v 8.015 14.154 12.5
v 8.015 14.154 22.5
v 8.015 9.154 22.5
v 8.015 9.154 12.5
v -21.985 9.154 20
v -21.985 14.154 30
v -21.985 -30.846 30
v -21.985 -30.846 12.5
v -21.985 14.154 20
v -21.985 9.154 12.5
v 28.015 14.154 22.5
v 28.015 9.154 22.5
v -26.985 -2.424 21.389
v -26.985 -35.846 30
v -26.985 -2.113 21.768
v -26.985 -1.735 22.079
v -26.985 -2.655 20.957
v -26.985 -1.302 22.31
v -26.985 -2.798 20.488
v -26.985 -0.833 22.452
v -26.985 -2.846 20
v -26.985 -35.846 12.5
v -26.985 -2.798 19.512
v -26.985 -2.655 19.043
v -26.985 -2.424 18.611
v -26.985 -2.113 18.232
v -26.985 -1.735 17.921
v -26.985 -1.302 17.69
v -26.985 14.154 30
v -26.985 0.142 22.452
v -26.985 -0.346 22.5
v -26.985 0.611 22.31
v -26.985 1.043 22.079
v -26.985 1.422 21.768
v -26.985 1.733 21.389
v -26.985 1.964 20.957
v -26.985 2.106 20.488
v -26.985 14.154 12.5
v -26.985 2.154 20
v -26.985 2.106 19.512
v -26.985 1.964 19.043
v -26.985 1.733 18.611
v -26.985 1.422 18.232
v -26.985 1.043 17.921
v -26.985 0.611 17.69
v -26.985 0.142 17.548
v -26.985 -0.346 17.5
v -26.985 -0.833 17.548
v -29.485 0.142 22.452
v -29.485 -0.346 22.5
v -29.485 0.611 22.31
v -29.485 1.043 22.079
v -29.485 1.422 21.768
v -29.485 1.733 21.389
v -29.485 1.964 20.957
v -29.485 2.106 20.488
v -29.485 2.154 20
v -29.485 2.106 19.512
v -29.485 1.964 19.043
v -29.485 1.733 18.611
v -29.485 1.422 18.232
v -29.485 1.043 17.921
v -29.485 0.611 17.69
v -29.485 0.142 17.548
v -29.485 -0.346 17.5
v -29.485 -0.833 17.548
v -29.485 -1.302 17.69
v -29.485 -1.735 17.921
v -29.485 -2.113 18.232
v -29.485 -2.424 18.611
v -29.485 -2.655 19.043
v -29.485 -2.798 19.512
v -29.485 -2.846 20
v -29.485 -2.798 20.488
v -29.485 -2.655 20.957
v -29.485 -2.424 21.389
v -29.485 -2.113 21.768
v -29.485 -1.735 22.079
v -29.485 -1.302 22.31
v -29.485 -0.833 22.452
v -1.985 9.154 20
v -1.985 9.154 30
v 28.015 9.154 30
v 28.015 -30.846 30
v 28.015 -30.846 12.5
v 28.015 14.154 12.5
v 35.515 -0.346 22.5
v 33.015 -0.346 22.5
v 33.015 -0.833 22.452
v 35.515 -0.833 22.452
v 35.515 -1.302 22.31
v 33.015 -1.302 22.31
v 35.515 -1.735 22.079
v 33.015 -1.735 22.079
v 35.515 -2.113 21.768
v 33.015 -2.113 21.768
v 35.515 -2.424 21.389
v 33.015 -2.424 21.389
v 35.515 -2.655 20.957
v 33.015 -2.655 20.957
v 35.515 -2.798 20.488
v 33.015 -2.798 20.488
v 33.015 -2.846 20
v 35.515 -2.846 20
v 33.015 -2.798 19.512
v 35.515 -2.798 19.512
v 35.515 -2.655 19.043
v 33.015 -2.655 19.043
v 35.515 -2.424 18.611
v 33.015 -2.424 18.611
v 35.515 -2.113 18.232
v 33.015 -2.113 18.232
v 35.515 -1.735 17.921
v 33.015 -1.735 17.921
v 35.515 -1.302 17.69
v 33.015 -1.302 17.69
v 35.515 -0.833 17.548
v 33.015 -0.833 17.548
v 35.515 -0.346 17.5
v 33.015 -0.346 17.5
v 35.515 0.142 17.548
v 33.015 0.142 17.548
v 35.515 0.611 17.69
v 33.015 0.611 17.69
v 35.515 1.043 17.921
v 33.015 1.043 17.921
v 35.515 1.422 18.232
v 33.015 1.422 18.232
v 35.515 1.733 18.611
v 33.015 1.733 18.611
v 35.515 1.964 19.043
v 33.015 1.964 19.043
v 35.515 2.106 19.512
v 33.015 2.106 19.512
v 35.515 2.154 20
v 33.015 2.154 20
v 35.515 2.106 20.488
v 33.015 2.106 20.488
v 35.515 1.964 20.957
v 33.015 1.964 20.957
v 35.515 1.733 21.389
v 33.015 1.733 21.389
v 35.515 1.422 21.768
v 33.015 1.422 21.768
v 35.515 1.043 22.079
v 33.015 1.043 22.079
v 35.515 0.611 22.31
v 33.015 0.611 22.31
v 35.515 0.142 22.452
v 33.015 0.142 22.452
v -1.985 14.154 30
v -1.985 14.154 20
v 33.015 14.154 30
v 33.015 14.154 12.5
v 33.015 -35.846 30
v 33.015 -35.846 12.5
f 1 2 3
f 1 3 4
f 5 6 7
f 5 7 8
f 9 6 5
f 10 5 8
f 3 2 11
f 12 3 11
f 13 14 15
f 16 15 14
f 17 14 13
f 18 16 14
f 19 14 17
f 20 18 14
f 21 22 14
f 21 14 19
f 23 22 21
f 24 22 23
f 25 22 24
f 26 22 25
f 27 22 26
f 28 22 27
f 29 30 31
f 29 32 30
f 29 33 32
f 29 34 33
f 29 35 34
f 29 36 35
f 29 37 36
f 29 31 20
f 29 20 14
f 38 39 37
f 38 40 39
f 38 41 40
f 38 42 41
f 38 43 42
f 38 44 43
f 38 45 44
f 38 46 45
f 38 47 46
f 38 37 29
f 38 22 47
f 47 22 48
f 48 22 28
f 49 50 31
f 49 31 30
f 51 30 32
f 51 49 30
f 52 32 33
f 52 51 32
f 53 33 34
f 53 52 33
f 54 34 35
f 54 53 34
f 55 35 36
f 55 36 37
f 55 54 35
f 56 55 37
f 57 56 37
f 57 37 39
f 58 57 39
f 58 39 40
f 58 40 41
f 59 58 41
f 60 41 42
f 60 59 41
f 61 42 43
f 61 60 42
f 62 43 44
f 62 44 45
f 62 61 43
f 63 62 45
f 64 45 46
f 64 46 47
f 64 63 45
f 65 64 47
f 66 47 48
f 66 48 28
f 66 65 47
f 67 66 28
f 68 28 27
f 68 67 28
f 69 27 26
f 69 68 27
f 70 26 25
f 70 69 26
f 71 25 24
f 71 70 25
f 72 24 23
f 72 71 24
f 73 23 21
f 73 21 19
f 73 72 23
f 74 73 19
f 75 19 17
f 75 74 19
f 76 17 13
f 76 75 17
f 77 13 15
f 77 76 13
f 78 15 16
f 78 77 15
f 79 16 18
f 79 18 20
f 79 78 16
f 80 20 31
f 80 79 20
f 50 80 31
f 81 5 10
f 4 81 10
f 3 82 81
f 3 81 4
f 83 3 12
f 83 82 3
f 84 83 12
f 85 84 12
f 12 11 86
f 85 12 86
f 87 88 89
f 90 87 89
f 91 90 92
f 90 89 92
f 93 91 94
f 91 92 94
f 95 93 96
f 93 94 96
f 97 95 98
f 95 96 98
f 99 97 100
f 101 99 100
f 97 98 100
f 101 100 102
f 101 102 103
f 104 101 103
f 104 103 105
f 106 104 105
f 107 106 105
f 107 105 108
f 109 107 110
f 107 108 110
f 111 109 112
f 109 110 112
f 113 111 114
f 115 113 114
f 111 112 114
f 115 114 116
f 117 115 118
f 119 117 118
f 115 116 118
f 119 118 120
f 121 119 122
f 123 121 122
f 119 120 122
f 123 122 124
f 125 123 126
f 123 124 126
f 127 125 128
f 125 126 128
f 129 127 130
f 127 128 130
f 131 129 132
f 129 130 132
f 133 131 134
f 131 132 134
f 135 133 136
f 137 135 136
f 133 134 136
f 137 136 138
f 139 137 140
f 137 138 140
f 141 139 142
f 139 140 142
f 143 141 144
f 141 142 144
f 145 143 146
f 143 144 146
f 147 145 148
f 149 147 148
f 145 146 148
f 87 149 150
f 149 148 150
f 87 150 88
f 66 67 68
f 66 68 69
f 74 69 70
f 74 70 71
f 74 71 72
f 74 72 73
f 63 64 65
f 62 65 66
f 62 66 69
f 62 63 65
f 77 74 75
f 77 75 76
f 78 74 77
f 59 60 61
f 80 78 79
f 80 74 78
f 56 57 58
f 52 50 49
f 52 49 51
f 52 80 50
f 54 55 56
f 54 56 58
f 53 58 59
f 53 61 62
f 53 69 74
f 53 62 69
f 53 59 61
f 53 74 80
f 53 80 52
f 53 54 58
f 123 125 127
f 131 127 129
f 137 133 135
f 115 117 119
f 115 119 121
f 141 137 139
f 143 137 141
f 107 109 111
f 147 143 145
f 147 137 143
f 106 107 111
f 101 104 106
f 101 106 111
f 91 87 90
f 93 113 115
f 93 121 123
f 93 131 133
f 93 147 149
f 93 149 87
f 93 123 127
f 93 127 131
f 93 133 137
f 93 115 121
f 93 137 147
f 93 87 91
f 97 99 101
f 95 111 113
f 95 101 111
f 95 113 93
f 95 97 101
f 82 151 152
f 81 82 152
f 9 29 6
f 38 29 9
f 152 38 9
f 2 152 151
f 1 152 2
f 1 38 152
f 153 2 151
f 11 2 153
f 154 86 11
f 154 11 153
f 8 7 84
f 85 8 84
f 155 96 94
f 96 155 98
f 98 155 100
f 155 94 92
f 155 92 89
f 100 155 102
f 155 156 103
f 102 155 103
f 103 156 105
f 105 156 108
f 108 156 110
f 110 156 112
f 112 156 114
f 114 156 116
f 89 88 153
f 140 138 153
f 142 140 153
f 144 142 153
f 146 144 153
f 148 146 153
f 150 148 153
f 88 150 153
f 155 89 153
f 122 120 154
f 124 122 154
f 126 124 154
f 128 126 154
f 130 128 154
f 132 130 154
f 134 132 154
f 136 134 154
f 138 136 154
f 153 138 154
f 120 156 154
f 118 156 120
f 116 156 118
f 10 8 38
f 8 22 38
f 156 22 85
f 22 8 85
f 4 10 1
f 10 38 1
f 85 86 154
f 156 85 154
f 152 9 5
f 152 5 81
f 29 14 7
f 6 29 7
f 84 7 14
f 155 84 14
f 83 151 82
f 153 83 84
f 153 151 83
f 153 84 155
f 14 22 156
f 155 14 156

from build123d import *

# Parameters (mm, degrees)
SKETCH1_W           = 60
SKETCH1_H           = 50
BOSS_EXTRUDE1_DEPTH = 30
SKETCH2_W           = 50
SKETCH2_H           = 40
CUT_EXTRUDE1_DEPTH  = 58.226541049
SKETCH3_W           = 20
SKETCH3_H           = 22.5
CUT_EXTRUDE2_DEPTH  = 5
SKETCH4_W           = 20
SKETCH4_H           = 10
CUT_EXTRUDE3_DEPTH  = 10
SKETCH5_W           = 62.459499436
SKETCH5_H           = 12.5
CUT_EXTRUDE4_DEPTH  = 68.007244418
SKETCH6_R           = 2.5
BOSS_EXTRUDE2_DEPTH = 2.5
BOSS_EXTRUDE3_START = 2.5
SKETCH7_R           = 2.5
BOSS_EXTRUDE3_DEPTH = 2.5


with BuildPart() as part:
    # Sketch1 → Boss-Extrude1 (new body)
    with BuildSketch(Plane.XY):
        with Locations((3.014705882, -10.845588235)):
            Rectangle(SKETCH1_W, SKETCH1_H)
    extrude(amount=BOSS_EXTRUDE1_DEPTH)

    # Sketch2 → Cut-Extrude1 (cut, through all)
    with BuildSketch(Plane.XY.offset(30)):
        with Locations((3.014705882, -10.845588235)):
            Rectangle(SKETCH2_W, SKETCH2_H)
    extrude(amount=-CUT_EXTRUDE1_DEPTH, mode=Mode.SUBTRACT)

    # Sketch3 → Cut-Extrude2 (cut)
    with BuildSketch(Plane(origin=(0, 14.154411765, 0), x_dir=(1, 0, 0), z_dir=(0, 1, 0))):
        with Locations((18.014705882, -11.25)):
            Rectangle(SKETCH3_W, SKETCH3_H)
    extrude(amount=-CUT_EXTRUDE2_DEPTH, mode=Mode.SUBTRACT)

    # Sketch4 → Cut-Extrude3 (cut)
    with BuildSketch(Plane(origin=(0, 14.154411765, 0), x_dir=(1, 0, 0), z_dir=(0, 1, 0))):
        with Locations((-11.985294118, -25)):
            Rectangle(SKETCH4_W, SKETCH4_H)
    extrude(amount=-CUT_EXTRUDE3_DEPTH, mode=Mode.SUBTRACT)

    # Sketch5 → Cut-Extrude4 (cut, through all)
    with BuildSketch(Plane(origin=(0, 14.154411765, 0), x_dir=(1, 0, 0), z_dir=(0, 1, 0))):
        with Locations((2.876613087, -6.25)):
            Rectangle(SKETCH5_W, SKETCH5_H)
    extrude(amount=-CUT_EXTRUDE4_DEPTH, mode=Mode.SUBTRACT)

    # Sketch6 → Boss-Extrude2 (add)
    with BuildSketch(Plane(origin=(33.014705882, 0, 0), x_dir=(0, 0, -1), z_dir=(1, 0, 0))):
        with Locations(Location((-20, -0.345588235, 0), (0, 0, 180))):
            Circle(SKETCH6_R)
    extrude(amount=BOSS_EXTRUDE2_DEPTH)

    # Sketch7 → Boss-Extrude3 (add)
    with BuildSketch(Plane.ZY.offset(26.985294118).offset(BOSS_EXTRUDE3_START)):
        with Locations((20, -0.345588235)):
            Circle(SKETCH7_R)
    extrude(amount=-BOSS_EXTRUDE3_DEPTH)


solid = part.part
